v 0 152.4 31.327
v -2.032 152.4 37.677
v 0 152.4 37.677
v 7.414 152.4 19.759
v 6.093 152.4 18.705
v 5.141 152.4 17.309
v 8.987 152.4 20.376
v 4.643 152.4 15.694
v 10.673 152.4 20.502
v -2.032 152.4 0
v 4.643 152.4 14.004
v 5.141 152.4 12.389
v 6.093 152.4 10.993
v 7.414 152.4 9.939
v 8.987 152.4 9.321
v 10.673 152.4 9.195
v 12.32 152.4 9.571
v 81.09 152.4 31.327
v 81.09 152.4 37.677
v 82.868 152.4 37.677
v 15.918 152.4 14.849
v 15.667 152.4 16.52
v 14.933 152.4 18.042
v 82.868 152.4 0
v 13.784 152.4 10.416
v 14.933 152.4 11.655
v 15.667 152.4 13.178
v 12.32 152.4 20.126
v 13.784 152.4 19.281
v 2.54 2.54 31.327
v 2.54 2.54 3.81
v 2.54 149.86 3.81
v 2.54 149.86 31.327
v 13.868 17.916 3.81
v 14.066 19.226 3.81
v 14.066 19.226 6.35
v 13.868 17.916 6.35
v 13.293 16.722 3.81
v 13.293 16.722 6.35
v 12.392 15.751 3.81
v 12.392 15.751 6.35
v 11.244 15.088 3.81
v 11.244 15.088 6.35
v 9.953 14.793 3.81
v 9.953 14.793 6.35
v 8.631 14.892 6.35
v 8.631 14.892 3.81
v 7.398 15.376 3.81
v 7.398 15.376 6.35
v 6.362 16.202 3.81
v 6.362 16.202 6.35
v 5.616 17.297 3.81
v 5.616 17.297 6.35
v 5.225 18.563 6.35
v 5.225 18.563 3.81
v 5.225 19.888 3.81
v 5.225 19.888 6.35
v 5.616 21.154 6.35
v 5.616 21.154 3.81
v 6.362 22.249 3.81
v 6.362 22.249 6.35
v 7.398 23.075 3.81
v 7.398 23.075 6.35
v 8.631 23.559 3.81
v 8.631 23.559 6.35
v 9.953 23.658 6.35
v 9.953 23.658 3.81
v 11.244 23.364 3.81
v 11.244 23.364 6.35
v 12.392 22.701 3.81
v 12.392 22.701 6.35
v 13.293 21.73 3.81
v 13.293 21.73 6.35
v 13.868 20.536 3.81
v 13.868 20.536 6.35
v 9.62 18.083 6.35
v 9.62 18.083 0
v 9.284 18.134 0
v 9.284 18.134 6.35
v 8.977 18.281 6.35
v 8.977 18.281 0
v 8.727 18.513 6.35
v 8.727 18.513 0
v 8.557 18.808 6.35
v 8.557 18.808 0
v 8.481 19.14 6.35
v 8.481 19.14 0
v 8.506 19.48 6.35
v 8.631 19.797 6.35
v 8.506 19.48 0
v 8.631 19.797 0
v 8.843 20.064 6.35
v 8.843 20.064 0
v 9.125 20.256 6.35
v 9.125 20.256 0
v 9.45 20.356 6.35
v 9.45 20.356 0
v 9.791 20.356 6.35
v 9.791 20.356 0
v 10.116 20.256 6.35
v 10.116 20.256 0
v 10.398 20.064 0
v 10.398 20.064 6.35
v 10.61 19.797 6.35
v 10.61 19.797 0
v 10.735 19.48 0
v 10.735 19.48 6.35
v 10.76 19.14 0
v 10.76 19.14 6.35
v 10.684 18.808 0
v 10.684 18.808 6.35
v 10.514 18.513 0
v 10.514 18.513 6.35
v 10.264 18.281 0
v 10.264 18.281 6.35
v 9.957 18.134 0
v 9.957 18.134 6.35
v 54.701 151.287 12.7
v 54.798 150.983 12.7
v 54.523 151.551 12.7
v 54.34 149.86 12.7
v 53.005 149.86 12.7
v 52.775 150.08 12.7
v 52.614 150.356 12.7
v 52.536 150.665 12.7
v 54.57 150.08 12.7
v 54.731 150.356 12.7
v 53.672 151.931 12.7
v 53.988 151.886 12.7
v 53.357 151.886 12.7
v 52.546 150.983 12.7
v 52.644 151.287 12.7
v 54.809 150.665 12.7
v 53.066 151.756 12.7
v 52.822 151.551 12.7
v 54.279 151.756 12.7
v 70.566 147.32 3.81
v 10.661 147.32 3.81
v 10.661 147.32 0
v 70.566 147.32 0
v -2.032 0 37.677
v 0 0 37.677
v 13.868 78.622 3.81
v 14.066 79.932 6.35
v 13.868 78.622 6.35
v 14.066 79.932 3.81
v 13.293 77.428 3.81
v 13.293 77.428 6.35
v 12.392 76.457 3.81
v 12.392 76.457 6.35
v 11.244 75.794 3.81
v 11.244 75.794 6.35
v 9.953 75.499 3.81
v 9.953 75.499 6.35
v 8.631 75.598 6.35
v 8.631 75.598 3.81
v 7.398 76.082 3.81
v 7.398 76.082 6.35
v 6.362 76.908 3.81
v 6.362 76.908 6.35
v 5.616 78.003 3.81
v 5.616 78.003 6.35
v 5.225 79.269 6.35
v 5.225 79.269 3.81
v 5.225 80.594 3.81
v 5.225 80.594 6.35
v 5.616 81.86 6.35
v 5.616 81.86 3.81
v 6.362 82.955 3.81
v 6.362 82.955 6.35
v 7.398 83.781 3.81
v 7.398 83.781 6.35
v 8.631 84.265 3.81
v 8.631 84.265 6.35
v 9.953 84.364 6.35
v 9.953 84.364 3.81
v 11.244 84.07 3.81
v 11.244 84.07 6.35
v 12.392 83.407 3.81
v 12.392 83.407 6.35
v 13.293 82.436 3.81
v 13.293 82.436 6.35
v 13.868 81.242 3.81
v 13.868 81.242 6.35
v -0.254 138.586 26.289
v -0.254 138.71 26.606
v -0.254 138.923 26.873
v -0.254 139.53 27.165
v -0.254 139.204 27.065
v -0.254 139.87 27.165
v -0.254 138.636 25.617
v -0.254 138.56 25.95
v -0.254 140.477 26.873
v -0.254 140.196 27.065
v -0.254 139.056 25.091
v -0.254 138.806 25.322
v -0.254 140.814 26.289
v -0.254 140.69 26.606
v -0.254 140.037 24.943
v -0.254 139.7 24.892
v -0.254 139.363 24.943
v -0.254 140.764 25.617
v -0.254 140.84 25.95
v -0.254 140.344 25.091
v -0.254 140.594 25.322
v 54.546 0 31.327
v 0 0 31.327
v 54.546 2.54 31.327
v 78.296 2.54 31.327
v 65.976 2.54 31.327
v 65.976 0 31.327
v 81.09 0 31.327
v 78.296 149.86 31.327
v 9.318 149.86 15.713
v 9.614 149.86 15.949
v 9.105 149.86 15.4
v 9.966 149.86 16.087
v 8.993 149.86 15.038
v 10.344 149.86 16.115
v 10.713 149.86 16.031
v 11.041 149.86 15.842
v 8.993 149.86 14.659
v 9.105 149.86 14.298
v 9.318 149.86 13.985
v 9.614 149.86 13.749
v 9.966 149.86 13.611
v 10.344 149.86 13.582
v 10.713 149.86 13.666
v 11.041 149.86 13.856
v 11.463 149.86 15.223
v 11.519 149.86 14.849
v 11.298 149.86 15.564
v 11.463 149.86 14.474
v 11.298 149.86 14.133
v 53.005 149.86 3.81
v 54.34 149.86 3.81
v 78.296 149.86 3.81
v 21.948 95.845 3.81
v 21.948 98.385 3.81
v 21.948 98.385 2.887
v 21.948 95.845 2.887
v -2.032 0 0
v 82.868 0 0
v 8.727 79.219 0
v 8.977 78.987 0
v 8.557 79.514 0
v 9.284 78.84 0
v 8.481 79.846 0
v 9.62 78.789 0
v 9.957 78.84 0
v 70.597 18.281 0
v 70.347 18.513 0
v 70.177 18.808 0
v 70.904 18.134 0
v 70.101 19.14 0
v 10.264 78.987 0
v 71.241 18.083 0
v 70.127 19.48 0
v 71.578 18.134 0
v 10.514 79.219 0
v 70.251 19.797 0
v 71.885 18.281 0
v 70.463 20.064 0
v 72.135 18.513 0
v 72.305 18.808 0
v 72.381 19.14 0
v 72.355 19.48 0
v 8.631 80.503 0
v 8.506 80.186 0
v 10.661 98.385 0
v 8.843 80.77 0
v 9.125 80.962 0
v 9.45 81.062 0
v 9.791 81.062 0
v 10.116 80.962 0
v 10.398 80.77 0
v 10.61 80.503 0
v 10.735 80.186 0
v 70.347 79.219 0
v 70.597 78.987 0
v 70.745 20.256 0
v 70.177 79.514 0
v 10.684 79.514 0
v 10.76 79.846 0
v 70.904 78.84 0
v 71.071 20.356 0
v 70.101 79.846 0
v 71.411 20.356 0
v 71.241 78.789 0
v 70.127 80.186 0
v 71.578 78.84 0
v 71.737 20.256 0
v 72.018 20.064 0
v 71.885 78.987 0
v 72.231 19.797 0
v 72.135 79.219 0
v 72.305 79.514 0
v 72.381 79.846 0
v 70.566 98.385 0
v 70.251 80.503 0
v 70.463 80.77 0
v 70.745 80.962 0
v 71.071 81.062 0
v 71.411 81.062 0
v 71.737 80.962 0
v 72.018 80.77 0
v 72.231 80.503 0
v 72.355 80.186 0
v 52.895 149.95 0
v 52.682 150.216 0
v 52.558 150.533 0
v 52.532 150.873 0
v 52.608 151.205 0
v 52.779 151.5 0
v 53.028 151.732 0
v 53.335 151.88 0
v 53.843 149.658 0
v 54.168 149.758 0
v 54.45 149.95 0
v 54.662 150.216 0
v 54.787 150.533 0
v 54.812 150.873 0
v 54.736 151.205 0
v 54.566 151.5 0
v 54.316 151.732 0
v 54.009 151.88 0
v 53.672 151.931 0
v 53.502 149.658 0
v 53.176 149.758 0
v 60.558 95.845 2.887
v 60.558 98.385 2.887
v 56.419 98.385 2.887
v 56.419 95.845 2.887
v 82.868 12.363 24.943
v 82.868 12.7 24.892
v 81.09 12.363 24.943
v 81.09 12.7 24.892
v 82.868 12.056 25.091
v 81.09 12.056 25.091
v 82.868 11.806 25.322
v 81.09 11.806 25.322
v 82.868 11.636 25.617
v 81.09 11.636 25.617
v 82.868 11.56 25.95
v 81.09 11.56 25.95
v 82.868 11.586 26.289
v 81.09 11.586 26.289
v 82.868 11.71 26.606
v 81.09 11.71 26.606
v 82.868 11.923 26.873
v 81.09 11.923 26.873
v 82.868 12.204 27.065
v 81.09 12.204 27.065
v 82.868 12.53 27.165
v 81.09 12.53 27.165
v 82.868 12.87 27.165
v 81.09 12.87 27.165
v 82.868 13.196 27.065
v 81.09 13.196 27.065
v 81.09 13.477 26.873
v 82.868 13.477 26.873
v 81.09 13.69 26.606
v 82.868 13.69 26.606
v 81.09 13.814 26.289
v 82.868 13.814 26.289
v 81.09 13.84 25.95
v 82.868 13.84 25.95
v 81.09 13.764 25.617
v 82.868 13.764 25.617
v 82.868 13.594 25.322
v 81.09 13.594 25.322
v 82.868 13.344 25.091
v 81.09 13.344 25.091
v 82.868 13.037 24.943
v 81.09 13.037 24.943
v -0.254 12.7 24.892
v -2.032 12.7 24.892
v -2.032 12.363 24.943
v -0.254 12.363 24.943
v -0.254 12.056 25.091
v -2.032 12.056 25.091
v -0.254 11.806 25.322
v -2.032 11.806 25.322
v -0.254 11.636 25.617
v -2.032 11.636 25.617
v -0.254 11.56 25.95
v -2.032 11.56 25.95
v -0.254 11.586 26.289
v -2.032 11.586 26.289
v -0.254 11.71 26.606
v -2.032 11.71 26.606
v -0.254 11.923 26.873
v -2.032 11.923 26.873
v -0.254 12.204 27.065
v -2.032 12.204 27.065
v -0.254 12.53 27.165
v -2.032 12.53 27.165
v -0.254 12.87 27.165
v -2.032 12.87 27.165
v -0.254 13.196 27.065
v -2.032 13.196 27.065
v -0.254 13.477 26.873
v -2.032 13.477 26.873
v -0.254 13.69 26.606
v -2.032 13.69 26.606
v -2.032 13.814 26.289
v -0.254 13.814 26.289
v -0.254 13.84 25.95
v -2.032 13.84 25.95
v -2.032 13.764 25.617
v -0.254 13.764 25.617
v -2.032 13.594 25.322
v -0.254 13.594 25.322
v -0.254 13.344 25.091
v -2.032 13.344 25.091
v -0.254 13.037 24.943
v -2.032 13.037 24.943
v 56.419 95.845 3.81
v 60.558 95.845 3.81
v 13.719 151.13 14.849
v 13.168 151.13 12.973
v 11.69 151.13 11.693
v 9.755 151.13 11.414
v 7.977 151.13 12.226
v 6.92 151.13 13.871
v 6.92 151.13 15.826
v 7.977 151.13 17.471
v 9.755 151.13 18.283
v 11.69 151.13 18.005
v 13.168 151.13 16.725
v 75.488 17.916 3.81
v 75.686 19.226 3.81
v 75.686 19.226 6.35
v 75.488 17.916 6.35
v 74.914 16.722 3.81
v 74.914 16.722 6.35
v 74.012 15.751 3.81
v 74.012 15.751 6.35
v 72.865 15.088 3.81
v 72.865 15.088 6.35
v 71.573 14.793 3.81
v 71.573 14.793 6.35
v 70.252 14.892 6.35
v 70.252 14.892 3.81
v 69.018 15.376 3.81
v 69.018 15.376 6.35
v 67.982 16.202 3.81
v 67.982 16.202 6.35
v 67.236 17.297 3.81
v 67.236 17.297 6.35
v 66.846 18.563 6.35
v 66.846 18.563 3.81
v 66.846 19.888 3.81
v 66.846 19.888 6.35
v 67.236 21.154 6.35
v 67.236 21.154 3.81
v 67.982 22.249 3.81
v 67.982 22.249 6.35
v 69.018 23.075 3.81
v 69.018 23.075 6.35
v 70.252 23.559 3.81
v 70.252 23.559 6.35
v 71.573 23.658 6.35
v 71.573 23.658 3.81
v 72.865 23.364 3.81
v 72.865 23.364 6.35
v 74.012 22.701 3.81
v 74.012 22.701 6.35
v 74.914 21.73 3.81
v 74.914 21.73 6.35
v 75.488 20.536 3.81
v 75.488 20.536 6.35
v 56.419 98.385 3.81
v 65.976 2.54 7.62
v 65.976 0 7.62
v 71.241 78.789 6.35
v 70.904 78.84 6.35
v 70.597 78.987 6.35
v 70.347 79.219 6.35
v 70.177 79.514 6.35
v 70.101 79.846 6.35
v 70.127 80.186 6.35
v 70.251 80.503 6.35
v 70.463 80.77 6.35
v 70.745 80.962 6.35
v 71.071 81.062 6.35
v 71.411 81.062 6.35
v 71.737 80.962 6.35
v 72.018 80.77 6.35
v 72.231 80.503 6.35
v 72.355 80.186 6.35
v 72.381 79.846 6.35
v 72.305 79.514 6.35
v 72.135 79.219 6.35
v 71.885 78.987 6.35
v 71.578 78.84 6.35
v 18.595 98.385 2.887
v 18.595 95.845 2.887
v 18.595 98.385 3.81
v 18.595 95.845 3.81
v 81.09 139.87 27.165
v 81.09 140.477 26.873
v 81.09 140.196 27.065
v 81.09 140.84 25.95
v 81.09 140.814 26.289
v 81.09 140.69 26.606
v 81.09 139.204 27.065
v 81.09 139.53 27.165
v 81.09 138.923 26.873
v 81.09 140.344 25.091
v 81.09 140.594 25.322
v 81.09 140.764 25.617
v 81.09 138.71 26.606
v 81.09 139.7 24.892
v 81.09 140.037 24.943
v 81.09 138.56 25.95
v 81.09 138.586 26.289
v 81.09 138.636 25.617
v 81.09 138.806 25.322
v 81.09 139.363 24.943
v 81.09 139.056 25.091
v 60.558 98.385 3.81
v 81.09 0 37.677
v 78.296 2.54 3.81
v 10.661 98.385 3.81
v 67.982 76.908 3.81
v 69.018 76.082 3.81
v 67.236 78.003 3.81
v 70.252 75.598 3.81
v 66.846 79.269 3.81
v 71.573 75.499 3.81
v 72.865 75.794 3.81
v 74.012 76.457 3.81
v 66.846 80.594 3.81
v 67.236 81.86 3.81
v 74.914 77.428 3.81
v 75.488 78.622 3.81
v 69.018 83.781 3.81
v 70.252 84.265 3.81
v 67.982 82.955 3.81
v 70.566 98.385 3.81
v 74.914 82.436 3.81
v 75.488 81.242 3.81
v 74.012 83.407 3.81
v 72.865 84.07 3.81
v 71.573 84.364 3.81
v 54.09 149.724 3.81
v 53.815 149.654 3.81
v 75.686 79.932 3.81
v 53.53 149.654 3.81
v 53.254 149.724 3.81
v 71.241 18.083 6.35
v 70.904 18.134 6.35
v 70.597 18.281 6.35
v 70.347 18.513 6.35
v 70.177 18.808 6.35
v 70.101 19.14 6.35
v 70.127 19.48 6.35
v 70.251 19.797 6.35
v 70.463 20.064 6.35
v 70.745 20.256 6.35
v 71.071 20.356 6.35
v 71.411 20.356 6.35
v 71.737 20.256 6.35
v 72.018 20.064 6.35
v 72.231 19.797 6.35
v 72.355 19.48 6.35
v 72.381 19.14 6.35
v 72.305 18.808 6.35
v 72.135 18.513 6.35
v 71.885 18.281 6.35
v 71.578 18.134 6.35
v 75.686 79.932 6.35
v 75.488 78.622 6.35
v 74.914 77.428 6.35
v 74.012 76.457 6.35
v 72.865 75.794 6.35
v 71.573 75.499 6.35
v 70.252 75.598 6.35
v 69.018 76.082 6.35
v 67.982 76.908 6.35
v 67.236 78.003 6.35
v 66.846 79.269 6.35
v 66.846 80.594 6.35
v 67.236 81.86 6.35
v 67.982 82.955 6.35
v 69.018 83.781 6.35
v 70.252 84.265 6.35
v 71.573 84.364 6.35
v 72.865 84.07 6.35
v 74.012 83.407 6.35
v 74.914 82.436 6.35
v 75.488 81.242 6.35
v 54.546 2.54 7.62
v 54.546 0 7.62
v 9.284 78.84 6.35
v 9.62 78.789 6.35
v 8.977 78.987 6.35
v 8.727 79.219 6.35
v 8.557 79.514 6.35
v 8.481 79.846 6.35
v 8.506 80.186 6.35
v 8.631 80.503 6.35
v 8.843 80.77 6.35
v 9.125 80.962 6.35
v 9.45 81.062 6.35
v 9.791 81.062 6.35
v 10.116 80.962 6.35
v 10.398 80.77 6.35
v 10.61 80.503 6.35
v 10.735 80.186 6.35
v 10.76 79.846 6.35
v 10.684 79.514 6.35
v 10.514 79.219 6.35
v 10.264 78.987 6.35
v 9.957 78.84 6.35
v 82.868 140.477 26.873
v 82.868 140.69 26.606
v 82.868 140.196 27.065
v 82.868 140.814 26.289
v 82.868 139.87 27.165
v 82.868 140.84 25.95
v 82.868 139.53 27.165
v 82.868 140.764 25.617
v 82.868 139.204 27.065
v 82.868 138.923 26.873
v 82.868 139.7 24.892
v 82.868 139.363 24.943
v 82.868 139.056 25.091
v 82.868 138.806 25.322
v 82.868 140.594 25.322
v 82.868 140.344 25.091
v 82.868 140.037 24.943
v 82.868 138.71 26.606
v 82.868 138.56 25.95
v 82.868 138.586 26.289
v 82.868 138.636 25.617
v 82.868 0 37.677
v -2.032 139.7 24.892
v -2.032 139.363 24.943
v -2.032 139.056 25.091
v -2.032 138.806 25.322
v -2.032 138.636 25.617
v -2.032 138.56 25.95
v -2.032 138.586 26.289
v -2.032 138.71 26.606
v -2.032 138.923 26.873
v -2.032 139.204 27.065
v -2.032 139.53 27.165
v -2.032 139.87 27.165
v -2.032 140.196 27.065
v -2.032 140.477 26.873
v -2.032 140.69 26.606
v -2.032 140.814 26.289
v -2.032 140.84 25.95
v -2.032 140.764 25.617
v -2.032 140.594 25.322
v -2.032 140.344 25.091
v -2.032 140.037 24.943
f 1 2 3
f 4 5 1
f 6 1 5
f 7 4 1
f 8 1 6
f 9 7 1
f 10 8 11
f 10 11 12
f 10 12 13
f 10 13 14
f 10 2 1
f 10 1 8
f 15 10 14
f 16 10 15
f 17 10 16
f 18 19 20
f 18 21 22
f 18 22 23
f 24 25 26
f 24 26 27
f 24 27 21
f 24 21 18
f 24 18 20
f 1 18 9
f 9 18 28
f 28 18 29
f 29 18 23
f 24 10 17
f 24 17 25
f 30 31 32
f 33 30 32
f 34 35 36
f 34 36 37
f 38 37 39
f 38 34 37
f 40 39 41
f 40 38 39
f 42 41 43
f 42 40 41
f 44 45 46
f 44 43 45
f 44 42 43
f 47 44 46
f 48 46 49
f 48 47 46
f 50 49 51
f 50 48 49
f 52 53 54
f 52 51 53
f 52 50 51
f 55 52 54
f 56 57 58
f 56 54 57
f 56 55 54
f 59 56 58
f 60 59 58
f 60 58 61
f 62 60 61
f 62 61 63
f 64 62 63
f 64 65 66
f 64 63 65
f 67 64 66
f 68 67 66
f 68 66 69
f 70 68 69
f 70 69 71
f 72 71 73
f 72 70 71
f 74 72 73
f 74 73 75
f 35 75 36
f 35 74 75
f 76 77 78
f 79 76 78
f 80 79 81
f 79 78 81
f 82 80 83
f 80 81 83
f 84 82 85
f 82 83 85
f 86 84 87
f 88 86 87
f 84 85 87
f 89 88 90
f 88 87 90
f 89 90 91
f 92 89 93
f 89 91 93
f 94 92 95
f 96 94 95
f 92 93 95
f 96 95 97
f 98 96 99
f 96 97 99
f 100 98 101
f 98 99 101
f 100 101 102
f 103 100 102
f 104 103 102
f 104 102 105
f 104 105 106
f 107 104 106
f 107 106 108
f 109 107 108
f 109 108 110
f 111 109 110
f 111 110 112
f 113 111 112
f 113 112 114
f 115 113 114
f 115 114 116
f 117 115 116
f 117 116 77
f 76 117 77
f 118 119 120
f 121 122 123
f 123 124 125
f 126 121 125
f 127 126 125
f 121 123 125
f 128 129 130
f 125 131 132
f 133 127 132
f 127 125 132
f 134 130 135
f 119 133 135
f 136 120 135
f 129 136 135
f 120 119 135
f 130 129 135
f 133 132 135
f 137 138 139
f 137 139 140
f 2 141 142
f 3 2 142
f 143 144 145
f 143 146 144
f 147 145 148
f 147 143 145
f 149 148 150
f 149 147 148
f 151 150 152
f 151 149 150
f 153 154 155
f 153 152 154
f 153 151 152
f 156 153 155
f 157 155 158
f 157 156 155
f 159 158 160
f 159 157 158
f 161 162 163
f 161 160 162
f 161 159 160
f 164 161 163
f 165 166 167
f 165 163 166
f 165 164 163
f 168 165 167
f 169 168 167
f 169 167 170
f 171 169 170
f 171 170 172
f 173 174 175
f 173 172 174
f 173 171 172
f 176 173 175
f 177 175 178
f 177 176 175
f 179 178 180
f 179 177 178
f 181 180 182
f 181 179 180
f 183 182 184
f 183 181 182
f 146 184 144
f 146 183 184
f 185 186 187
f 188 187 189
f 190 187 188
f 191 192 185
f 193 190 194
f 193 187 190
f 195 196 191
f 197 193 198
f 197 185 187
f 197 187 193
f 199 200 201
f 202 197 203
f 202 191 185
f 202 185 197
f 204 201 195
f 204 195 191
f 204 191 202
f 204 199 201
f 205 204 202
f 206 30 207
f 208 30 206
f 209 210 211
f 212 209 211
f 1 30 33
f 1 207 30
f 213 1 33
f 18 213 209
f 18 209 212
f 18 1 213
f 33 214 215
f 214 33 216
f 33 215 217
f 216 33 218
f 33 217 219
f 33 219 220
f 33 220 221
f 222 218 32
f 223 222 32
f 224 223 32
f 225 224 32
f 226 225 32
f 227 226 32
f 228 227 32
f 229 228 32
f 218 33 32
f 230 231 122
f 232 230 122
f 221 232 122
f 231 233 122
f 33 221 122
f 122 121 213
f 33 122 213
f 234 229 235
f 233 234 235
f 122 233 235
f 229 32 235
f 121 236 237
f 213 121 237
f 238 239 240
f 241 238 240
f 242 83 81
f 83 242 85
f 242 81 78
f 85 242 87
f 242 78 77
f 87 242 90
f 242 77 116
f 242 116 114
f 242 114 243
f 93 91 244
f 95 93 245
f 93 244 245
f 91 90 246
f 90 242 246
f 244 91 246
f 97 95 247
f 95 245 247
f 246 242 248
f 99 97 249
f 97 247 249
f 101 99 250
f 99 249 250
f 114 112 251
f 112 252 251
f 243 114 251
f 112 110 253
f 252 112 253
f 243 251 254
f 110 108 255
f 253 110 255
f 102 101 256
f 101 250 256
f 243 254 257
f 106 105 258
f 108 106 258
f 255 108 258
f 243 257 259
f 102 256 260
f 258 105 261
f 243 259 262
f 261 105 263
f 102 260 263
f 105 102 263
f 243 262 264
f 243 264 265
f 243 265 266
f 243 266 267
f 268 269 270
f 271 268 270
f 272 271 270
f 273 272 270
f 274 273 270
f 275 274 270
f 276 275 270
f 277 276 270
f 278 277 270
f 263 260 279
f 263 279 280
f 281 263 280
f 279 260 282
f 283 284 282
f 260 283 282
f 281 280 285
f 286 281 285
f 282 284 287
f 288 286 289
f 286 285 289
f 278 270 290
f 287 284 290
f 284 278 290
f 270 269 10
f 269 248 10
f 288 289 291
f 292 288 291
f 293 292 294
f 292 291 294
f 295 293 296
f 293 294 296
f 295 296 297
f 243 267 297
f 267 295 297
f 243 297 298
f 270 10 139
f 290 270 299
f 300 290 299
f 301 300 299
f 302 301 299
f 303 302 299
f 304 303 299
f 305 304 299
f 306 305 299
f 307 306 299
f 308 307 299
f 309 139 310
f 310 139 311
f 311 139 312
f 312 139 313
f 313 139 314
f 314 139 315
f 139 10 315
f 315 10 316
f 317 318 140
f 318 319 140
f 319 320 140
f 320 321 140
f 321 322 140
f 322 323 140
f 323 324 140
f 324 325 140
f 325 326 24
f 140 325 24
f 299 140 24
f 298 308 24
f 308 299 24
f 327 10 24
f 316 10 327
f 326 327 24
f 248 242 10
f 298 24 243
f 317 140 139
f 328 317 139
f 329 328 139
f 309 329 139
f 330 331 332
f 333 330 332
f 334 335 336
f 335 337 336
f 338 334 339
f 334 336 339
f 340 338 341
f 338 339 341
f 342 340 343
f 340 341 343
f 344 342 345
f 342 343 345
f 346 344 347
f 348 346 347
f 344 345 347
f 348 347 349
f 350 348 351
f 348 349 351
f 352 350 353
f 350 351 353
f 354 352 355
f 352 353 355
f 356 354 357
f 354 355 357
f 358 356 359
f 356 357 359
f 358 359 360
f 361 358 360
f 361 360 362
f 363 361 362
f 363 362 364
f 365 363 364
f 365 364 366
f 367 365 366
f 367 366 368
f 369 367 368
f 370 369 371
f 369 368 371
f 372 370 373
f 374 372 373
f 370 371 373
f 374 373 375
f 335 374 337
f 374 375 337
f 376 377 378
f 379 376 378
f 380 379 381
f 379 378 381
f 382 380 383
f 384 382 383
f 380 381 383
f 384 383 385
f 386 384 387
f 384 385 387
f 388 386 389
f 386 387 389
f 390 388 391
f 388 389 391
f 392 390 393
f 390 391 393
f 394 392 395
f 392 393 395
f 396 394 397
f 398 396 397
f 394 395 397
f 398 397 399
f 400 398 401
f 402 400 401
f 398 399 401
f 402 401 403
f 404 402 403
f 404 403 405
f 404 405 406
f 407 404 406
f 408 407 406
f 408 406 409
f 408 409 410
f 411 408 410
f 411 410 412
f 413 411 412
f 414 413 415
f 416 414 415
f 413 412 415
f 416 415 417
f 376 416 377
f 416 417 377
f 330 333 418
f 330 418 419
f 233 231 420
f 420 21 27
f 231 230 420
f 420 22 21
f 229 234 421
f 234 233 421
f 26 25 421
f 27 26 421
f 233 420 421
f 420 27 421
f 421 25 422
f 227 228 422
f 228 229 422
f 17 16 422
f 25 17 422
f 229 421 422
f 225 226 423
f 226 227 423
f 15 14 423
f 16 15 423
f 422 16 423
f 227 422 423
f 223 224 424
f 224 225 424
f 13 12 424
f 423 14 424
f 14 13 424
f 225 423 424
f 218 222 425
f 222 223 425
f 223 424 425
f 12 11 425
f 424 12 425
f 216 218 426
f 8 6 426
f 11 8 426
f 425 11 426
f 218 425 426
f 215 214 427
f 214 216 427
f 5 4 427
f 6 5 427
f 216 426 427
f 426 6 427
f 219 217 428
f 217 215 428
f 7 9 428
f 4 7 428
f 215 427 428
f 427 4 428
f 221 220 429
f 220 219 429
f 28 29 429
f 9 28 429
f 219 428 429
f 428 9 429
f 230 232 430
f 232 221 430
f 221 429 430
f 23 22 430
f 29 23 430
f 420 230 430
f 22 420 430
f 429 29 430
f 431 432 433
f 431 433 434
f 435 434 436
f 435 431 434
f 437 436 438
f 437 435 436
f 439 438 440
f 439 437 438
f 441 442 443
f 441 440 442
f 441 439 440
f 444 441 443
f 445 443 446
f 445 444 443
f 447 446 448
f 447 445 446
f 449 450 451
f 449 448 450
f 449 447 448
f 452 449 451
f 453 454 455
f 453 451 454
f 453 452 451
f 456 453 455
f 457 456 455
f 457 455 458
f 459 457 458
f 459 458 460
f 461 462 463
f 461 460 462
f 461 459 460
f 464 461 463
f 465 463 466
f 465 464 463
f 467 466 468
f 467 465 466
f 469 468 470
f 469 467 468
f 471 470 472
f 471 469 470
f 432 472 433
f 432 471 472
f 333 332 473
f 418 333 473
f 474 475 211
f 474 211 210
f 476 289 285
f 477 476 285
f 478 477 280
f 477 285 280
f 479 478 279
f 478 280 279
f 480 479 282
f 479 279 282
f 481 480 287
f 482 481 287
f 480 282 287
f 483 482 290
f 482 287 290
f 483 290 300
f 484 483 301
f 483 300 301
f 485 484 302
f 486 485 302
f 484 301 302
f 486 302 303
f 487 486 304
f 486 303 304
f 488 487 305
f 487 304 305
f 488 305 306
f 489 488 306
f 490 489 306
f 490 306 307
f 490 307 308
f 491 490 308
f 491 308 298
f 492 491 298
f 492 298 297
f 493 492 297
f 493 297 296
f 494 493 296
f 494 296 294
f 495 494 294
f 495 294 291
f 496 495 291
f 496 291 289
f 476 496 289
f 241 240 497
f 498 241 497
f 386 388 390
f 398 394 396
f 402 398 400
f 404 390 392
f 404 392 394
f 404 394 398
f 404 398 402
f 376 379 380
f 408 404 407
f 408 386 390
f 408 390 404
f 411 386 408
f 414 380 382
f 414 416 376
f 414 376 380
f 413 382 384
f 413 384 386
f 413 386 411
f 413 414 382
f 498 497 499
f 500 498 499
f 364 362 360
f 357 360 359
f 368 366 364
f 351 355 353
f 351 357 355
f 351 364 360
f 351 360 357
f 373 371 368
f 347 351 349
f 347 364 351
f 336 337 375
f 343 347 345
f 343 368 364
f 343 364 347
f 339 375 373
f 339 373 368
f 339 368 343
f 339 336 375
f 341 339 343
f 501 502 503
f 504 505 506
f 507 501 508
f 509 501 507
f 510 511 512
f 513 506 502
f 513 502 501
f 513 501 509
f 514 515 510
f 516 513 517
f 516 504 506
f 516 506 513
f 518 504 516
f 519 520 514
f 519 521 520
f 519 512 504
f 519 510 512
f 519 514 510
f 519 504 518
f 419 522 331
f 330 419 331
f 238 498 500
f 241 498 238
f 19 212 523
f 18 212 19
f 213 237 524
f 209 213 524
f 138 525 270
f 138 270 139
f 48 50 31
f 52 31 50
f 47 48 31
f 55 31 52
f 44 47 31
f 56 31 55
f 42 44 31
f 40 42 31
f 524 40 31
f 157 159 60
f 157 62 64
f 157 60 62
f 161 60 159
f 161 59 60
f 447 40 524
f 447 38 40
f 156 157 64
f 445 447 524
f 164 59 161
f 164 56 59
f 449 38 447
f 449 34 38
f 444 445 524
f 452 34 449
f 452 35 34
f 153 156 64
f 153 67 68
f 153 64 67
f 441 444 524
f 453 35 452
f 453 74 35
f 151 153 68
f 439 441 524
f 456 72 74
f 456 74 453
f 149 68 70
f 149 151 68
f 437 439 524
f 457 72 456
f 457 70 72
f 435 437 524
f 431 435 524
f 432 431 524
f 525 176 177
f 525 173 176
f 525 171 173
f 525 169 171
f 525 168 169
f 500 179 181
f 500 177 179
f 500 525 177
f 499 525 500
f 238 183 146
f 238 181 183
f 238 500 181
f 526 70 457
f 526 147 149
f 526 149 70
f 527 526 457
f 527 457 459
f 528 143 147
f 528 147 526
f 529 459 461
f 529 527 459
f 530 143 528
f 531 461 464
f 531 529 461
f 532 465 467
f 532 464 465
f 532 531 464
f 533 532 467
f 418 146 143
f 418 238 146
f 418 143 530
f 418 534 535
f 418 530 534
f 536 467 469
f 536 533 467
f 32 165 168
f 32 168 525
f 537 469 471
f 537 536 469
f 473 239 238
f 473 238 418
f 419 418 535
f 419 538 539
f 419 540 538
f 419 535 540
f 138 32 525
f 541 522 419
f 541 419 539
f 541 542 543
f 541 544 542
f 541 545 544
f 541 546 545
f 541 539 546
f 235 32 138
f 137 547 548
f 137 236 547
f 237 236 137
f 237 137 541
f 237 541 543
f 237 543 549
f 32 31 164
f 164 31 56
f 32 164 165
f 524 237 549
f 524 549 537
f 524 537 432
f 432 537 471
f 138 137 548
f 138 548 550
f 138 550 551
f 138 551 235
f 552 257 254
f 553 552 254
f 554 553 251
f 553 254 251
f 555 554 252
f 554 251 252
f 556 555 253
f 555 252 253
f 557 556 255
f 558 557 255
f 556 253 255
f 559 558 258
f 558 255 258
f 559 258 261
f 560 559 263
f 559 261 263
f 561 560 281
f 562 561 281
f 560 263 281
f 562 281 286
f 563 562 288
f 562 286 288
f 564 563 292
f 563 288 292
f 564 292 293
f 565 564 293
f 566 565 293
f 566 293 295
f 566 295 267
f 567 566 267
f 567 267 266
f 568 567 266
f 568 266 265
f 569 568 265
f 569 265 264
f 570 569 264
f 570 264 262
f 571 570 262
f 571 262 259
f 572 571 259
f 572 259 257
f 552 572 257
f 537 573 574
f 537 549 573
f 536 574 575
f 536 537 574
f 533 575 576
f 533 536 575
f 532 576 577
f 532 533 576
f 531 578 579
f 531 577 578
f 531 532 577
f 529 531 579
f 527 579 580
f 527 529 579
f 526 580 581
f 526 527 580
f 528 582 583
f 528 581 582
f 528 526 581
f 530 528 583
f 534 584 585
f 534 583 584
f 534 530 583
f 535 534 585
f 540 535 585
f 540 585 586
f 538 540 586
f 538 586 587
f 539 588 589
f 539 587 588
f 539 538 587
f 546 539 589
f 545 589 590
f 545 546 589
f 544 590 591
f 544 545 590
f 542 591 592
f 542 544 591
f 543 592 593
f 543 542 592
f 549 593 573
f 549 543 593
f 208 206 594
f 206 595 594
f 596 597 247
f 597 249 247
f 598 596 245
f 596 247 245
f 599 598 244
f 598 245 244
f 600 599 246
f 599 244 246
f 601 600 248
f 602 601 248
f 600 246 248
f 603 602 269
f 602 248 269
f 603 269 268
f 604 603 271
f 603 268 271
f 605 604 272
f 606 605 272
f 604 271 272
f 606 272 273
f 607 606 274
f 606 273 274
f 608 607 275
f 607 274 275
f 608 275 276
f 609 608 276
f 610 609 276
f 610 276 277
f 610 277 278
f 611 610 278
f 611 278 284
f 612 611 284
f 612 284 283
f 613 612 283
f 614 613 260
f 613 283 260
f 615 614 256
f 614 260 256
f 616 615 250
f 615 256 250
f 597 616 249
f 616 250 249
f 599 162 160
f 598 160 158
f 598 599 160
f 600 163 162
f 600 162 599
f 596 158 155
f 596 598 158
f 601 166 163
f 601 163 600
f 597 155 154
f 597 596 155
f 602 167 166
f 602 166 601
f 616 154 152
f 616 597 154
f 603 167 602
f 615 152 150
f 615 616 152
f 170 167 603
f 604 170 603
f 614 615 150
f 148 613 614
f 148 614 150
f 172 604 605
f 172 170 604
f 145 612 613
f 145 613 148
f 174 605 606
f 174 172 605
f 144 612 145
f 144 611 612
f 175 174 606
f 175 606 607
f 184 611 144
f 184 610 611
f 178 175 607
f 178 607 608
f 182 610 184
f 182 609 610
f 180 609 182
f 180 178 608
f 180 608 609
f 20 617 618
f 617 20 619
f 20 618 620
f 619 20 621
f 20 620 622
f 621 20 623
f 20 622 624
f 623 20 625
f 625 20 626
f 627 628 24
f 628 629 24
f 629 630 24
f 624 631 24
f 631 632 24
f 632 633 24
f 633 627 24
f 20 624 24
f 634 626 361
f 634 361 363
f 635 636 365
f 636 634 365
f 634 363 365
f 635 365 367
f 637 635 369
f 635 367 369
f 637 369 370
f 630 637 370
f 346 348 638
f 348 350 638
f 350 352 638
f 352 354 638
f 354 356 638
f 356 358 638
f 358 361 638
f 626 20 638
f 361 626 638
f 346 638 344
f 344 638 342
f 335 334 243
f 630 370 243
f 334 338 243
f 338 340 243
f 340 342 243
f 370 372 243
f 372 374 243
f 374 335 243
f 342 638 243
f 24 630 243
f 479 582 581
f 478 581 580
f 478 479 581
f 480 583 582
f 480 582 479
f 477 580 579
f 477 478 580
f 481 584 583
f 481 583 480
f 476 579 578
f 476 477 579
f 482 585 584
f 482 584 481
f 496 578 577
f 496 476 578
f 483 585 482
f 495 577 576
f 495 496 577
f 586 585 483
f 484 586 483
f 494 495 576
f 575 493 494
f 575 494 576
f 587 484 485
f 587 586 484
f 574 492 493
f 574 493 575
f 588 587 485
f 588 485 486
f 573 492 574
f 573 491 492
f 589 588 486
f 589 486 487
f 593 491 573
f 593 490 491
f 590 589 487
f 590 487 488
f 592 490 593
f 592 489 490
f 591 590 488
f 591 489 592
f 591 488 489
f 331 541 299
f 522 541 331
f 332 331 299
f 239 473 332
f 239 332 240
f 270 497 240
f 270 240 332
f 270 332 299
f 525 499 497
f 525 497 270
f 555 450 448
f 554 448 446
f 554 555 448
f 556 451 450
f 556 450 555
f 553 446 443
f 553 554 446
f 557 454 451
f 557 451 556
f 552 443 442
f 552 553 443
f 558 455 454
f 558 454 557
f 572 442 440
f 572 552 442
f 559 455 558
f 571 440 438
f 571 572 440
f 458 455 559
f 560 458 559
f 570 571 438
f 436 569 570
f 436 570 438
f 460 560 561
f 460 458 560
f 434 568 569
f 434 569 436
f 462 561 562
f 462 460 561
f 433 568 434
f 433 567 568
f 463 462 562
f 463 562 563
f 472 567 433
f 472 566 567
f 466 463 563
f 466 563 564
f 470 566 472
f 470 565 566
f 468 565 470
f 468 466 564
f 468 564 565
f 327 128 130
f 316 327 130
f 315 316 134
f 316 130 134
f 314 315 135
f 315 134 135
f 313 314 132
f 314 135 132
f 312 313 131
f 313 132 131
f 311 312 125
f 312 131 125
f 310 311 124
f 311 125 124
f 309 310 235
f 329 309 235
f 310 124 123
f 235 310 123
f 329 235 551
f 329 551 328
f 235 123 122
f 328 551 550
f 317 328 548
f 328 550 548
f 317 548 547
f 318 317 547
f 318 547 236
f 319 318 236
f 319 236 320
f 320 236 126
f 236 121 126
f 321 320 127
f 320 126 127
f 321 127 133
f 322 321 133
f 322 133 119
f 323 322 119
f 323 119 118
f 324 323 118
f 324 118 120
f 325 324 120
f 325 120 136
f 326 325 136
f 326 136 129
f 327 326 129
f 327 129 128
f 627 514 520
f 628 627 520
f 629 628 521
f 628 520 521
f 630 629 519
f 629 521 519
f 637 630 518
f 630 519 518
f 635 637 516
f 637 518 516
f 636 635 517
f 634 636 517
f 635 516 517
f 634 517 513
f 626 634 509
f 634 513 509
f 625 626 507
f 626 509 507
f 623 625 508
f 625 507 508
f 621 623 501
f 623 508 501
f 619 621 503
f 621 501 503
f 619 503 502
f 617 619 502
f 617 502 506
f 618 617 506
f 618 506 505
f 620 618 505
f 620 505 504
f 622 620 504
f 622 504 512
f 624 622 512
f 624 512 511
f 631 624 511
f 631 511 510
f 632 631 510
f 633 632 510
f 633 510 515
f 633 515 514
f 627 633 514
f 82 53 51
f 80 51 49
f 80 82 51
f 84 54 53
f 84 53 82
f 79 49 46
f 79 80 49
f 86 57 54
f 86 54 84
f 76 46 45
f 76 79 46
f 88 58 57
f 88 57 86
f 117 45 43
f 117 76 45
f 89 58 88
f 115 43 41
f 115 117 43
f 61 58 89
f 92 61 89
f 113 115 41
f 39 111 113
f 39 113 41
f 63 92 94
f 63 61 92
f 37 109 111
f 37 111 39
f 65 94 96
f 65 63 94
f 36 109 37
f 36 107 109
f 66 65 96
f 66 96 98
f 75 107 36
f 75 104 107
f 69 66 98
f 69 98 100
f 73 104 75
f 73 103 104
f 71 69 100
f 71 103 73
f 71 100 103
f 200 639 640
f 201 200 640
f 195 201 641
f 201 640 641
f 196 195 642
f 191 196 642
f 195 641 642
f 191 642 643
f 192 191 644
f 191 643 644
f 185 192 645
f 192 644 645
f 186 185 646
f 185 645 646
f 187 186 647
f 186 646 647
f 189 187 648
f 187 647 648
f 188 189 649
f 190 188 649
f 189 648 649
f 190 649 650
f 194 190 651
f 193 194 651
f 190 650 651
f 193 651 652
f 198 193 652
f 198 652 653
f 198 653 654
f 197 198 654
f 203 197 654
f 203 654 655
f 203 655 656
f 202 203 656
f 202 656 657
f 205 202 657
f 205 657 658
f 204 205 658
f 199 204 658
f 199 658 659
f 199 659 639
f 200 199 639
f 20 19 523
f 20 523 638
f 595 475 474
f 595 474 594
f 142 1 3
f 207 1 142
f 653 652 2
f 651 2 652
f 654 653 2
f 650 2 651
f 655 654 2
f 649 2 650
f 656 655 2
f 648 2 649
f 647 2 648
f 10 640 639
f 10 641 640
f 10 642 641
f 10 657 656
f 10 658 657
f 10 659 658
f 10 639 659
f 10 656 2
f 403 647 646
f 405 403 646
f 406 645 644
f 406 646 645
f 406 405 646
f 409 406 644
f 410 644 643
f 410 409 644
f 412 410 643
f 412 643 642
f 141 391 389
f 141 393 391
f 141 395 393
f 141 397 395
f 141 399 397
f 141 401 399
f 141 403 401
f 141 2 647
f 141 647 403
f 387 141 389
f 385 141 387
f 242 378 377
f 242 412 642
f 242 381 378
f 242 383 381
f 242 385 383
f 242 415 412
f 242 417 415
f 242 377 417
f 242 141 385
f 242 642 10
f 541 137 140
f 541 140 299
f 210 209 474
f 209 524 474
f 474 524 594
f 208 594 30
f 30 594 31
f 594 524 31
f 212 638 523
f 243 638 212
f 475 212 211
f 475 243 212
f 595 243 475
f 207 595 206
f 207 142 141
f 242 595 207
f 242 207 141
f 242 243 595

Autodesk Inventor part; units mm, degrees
ref_plane "YZ Plane" through (0, 0, 0) normal (1, 0, 0) x (0, 1, 0)
ref_plane "XZ Plane" through (0, 0, 0) normal (0, 1, 0) x (-1, 0, 0)
ref_plane "XY Plane" through (0, 0, 0) normal (0, 0, 1) x (1, 0, 0)
sketch "Sketch1" plane through (0, 0, 0) normal (0, 0, 1) x (1, 0, 0)
  line L0 (0, 0) -> (80.8355, 0)
  line L1 (80.8355, 0) -> (80.8355, 152.4)
  line L2 (80.8355, 152.4) -> (0, 152.4)
  line L3 (0, 152.4) -> (0, 0)
  dimension "d82" = 80.8355
  dimension "d90" = 152.4
extrude "Extrusion1" add sketch "Sketch1" along normal blind 22.86
sketch "Sketch2" plane through (0, 0, 22.86) normal (0, 0, 1) x (1, 0, 0)
  line L0 (2.54, 2.54) -> (78.2955, 2.54)
  line L1 (78.2955, 2.54) -> (78.2955, 149.86)
  line L2 (78.2955, 149.86) -> (2.54, 149.86)
  line L3 (2.54, 149.86) -> (2.54, 2.54)
  line L4 (0, 152.4) -> (0, 0)
  line L5 (0, 0) -> (80.8355, 0)
  line L6 (80.8355, 0) -> (80.8355, 152.4)
  line L7 (80.8355, 152.4) -> (0, 152.4)
  line L8 (0, 152.4) -> (0, 0) projected
  line L9 (0, 0) -> (80.8355, 0) projected
  point P0 (80.8355, 76.2)
  point P1 (0, 76.2)
  point P2 (40.4177, 0)
  dimension "d83" = 152.4
  dimension "d85" = 80.8355
  dimension "d86" = 2.54
  dimension "d87" = 2.54
  dimension "d88" = 2.54
  dimension "d89" = 2.54
extrude "Extrusion2" cut sketch "Sketch2" against normal blind 19.05 contours L3 L2 L1 L0
sketch "Sketch6" plane through (0, 0, 3.81) normal (0, 0, 1) x (1, 0, 0)
  line L0 (5.1487, 87.2258) -> (75.6867, 87.2258) construction
  line L1 (75.6867, 87.2258) -> (75.6867, 3.2258) construction
  line L2 (75.6867, 3.2258) -> (5.1487, 3.2258) construction
  line L3 (5.1487, 3.2258) -> (5.1487, 87.2258) construction
  circle A0 centre (9.6205, 79.9318) radius 1.6 construction
  circle A1 centre (71.2409, 79.9318) radius 1.6 construction
  circle A2 centre (9.6205, 19.2258) radius 1.6 construction
  circle A3 centre (71.2409, 19.2258) radius 1.6 construction
  line L4 (2.54, 149.86) -> (78.2955, 149.86) projected
  line L5 (0, 0) -> (80.8355, 0) projected
  line L6 (78.2955, 2.54) -> (2.54, 2.54) projected
  circle A4 centre (9.6205, 79.9318) radius 4.445
  circle A5 centre (71.2409, 79.9318) radius 4.445
  circle A6 centre (9.6205, 19.2258) radius 4.445
  circle A7 centre (71.2409, 19.2258) radius 4.445
  point P0 (40.4177, 87.2258)
  point P1 (40.4177, 149.86)
  point P2 (3.175, 0)
  point P3 (77.6605, 0)
  point P4 (2.54, 2.54)
  point P5 (14.1287, 30.2258)
  point P6 (46.6867, 15.7258)
  point P7 (60.2637, 3.2258)
  point P8 (80.8355, 12.6941)
  dimension "d18" = 70.538
  dimension "d19" = 84
  dimension "d30" = 3.2
  dimension "d31" = 60.706
  dimension "d32" = 61.6204
  dimension "d33" = 16
  dimension "d34" = 4.4458
  dimension "d36" = 0.6858
  dimension "d37" = 27
  dimension "d38" = 8.98
  dimension "d39" = 12.5
  dimension "d40" = 29
  dimension "d41" = 15.423
  dimension "d69" = 8.89
  dimension "d70" = 8.89
  dimension "d71" = 8.89
  dimension "d72" = 8.89
extrude "Extrusion7" add sketch "Sketch6" along normal blind 2.54
sketch "Sketch15" plane through (9.6205, 79.9318, 6.35) normal (0, 0, 1) x (1, 0, 0)
  circle A0 centre (0, 0) radius 4.445 projected
  circle A1 centre (61.6204, 0) radius 4.445 projected
  circle A2 centre (61.6204, -60.706) radius 4.445 projected
  circle A3 centre (0, -60.706) radius 4.445 projected
  point P0 (-9.6205, -79.9318)
  point P1 (61.6204, -60.706)
  point P2 (0, -60.706)
hole "Hole3" at (9.6205, 79.9318, 6.35) at (71.2409, 79.9318, 6.35) at (71.2409, 19.2258, 6.35) at (9.6205, 19.2258, 6.35) direction (0, 0, -1) diameter 2.286 depth 6.35
sketch "Sketch16" plane through (0, 0, 3.81) normal (0, 0, 1) x (1, 0, 0)
  line L0 (10.6608, 147.32) -> (70.5655, 147.32)
  line L1 (70.5655, 147.32) -> (70.5655, 98.3851)
  line L2 (70.5655, 98.3851) -> (10.6608, 98.3851)
  line L3 (10.6608, 98.3851) -> (10.6608, 147.32)
  line L4 (2.54, 149.86) -> (78.2955, 149.86) projected
  point P0 (0, 0)
  dimension "d150" = 48.9349
  dimension "d151" = 59.9047
  dimension "d152" = 2.54
extrude "Extrusion8" cut sketch "Sketch16" against normal blind 25.4
sketch "Sketch17" plane through (2.54, 149.86, 22.86) normal (0, -1, 0) x (1, 0, 0)
  circle A0 centre (7.709, -8.0113) radius 1.27
  point P0 (-2.54, -22.86)
  dimension "d93" = 2.54
extrude "Extrusion9" cut sketch "Sketch17" along normal blind 25.4 and the other way blind 12.7 draft 60
sketch "Sketch18" plane through (10.6608, 98.3851, 3.81) normal (0, 1, 0) x (1, 0, 0)
  line L0 (59.9047, 0) -> (0, 0) projected
  line L1 (7.9345, 0) -> (11.287, 0)
  line L2 (11.287, 0) -> (11.287, 0.9229)
  line L3 (11.287, 0.9229) -> (7.9345, 0.9229)
  line L4 (7.9345, 0.9229) -> (7.9345, 0)
  line L5 (45.7582, 0) -> (49.8968, 0)
  line L6 (49.8968, 0) -> (49.8968, 0.9229)
  line L7 (49.8968, 0.9229) -> (45.7582, 0.9229)
  line L8 (45.7582, 0.9229) -> (45.7582, 0)
  point P0 (-10.6608, 3.81)
  point P1 (11.287, 0)
extrude "Extrusion10" cut sketch "Sketch18" against normal blind 2.54
sketch "Sketch19" plane through (0, 0, 3.81) normal (0, 0, 1) x (1, 0, 0)
  point P0 (0, 0)
sketch "Sketch23" plane through (0, 0, 0) normal (0, 0, -1) x (-1, 0, 0)
  line L0 (-84.6455, 152.4) -> (3.81, 152.4)
  line L1 (3.81, 152.4) -> (3.81, 0)
  line L2 (3.81, 0) -> (-84.6455, 0)
  line L3 (-84.6455, 0) -> (-84.6455, 152.4)
  line L4 (0, 0) -> (-80.8355, 0) projected
  line L5 (-80.8355, 152.4) -> (0, 152.4) projected
  line L6 (-80.8355, 0) -> (-80.8355, 152.4) projected
  line L7 (0, 152.4) -> (0, 0) projected
  point P0 (0, 152.4)
  dimension "d109" = 0
  dimension "d110" = 0
  dimension "d111" = 3.81
  dimension "d112" = 3.81
extrude "Extrusion12" add sketch "Sketch23" against normal blind 29.21 contours L0 L6 L2 L3 | L0 L1 L2 L7
sketch "Sketch24" plane through (84.6455, 0, 0) normal (1, 0, 0) x (0, 0, -1)
  line L0 (-29.21, 0) -> (-29.21, 152.4) projected
  line L1 (0, 152.4) -> (-29.21, 152.4) projected
  line L2 (0, 0) -> (-29.21, 0) projected
  point P0 (-26.035, 12.7)
  point P1 (-26.035, 139.7)
  dimension "d115" = 3.175
  dimension "d116" = 12.7
  dimension "d117" = 12.7
  dimension "d118" = 3.175
hole "Hole5" at (84.6455, 139.7, 26.035) at (84.6455, 12.7, 26.035) direction (-1, 0, 0) diameter 2.286 end through all
sketch "Sketch25" plane through (-3.81, 0, 0) normal (0, -1, 0) x (1, 0, 0)
  line L0 (3.81, 22.86) -> (84.6455, 22.86) projected
  line L1 (58.3565, 22.86) -> (69.7865, 22.86)
  line L2 (69.7865, 22.86) -> (69.7865, 7.62)
  line L3 (69.7865, 7.62) -> (58.3565, 7.62)
  line L4 (58.3565, 7.62) -> (58.3565, 22.86)
  line L5 (88.4555, 0) -> (88.4555, 29.21) projected
  point P0 (3.81, 0)
  point P1 (69.7865, 15.24)
  point P2 (64.0715, 22.86)
  point P3 (64.0715, 7.62)
  point P4 (44.2278, 22.86)
  dimension "d126" = 11.43
  dimension "d127" = 15.24
  dimension "d129" = 19.8438
extrude "Extrusion13" cut sketch "Sketch25" against normal up to surface (2.54 mm away)
sketch "Sketch26" plane through (-3.81, 0, 0) normal (0, -1, 0) x (1, 0, 0)
  line L0 (0, 29.21) -> (3.81, 29.21) projected
  line L1 (3.556, 29.21) -> (84.8995, 29.21)
  line L2 (84.8995, 29.21) -> (84.8995, 22.86)
  line L3 (84.8995, 22.86) -> (3.556, 22.86)
  line L4 (3.556, 22.86) -> (3.556, 29.21)
  line L5 (3.81, 22.86) -> (58.3565, 22.86) projected
  line L6 (3.81, 22.86) -> (3.81, 29.21) projected
  line L7 (84.6455, 22.86) -> (84.6455, 29.21) projected
  line L8 (3.81, 29.21) -> (84.6455, 29.21)
  line L9 (84.6455, 29.21) -> (84.6455, 22.86)
  line L10 (84.6455, 22.86) -> (3.81, 22.86)
  line L11 (3.81, 22.86) -> (3.81, 29.21)
  point P0 (3.81, 0)
  point P1 (84.8995, 26.035)
  dimension "d132" = 0
  dimension "d133" = 0.254
  dimension "d134" = 0.254
extrude "Extrusion14" cut sketch "Sketch26" against normal through all contours L0 L6 L3 L4 | L1 L2 L3 L7
sketch "Sketch27" plane through (-3.81, 0, 0) normal (0, -1, 0) x (1, 0, 0)
  line L0 (0, 29.21) -> (1.778, 29.21)
  line L1 (1.778, 29.21) -> (1.778, 0)
  line L2 (1.778, 0) -> (0, 0)
  line L3 (0, 0) -> (0, 29.21)
  line L4 (3.556, 22.86) -> (3.556, 29.21) projected
  line L5 (88.4555, 0) -> (88.4555, 29.21) projected
  line L6 (88.4555, 0) -> (0, 0) projected
  line L7 (88.4555, 29.21) -> (86.6775, 29.21)
  line L8 (86.6775, 29.21) -> (86.6775, 0)
  line L9 (86.6775, 0) -> (88.4555, 0)
  line L10 (88.4555, 0) -> (88.4555, 29.21)
  point P0 (3.81, 0)
  point P1 (0.889, 0)
  dimension "d137" = 1.778
  dimension "d138" = 1.778
  dimension "d139" = 0
extrude "Extrusion15" cut sketch "Sketch27" against normal through all
sketch "Sketch28" plane through (0, 0, 22.86) normal (0, 0, 1) x (1, 0, 0)
  line L0 (-0.254, 152.4) -> (81.0895, 152.4) projected
  line L1 (82.8675, 0) -> (-2.032, 0) projected
  line L2 (-0.254, 152.4) -> (81.0895, 152.4)
  line L3 (81.0895, 152.4) -> (81.0895, 0)
  line L4 (81.0895, 0) -> (-0.254, 0)
  line L5 (-0.254, 0) -> (-0.254, 152.4)
  line L6 (81.0895, 152.4) -> (81.0895, 0) projected
  line L7 (2.54, 149.86) -> (78.2955, 149.86) projected
  line L8 (78.2955, 149.86) -> (78.2955, 2.54) projected
  line L9 (2.54, 149.86) -> (78.2955, 149.86)
  line L10 (78.2955, 149.86) -> (78.2955, 2.54)
  line L11 (78.2955, 2.54) -> (2.54, 2.54)
  line L12 (2.54, 2.54) -> (2.54, 149.86)
  line L13 (54.5465, 2.54) -> (2.54, 2.54) projected
  line L14 (54.5465, 0) -> (54.5465, 2.54) projected
  line L15 (54.5465, 2.54) -> (54.5465, 0)
  line L16 (65.9765, 0) -> (65.9765, 2.54) projected
  line L17 (65.9765, 0) -> (65.9765, 2.54)
  line L18 (78.2955, 2.54) -> (2.54, 2.54) projected
  point P0 (0, 0)
  point P1 (-0.254, 0)
  dimension "d142" = 0
extrude "Extrusion16" add sketch "Sketch28" along normal blind 8.4667 contours L0 L3 L1 L16 L11 L8 L7 L12 L14 L5
sketch "Sketch29" plane through (0, 0, 29.21) normal (0, 0, 1) x (1, 0, 0)
  line L0 (-2.032, 152.4) -> (82.8675, 152.4) projected
  line L1 (-2.032, 152.4) -> (0, 152.4)
  line L2 (0, 152.4) -> (0, 0)
  line L3 (0, 0) -> (-2.032, 0)
  line L4 (-2.032, 0) -> (-2.032, 152.4)
  line L5 (82.8675, 0) -> (82.8675, 152.4) projected
  line L6 (81.0895, 0) -> (81.0895, 152.4) projected
  line L7 (82.8675, 152.4) -> (81.0895, 152.4)
  line L8 (81.0895, 152.4) -> (81.0895, 0)
  line L9 (81.0895, 0) -> (82.8675, 0)
  line L10 (82.8675, 0) -> (82.8675, 152.4)
extrude "Extrusion17" add sketch "Sketch29" along normal blind 8.4667
sketch "Sketch30" plane through (0, 0, 3.81) normal (0, 0, 1) x (1, 0, 0)
  line L0 (10.6608, 147.32) -> (70.5655, 147.32) projected
  line L1 (70.5655, 147.32) -> (70.5655, 98.3851) projected
  point P0 (0, 0)
  point P1 (53.6723, 150.7878)
  point P2 (57.4821, 140.1387)
  dimension "d154" = 3.4678
  dimension "d155" = 16.8932
sketch "Sketch31" plane through (0, 0, 0) normal (0, 0, -1) x (-1, 0, 0)
  line L0 (-70.5655, 147.32) -> (-10.6608, 147.32) projected
  line L1 (-70.5655, 98.3851) -> (-70.5655, 147.32) projected
  point P0 (0, 0)
  point P1 (-53.6723, 150.7878)
  dimension "d156" = 3.4678
  dimension "d157" = 16.8932
hole "Hole6" at (53.6723, 150.7878, 0) direction (0, 0, 1) diameter 2.286 depth 12.7
properties part number "Bottom_Shell"
